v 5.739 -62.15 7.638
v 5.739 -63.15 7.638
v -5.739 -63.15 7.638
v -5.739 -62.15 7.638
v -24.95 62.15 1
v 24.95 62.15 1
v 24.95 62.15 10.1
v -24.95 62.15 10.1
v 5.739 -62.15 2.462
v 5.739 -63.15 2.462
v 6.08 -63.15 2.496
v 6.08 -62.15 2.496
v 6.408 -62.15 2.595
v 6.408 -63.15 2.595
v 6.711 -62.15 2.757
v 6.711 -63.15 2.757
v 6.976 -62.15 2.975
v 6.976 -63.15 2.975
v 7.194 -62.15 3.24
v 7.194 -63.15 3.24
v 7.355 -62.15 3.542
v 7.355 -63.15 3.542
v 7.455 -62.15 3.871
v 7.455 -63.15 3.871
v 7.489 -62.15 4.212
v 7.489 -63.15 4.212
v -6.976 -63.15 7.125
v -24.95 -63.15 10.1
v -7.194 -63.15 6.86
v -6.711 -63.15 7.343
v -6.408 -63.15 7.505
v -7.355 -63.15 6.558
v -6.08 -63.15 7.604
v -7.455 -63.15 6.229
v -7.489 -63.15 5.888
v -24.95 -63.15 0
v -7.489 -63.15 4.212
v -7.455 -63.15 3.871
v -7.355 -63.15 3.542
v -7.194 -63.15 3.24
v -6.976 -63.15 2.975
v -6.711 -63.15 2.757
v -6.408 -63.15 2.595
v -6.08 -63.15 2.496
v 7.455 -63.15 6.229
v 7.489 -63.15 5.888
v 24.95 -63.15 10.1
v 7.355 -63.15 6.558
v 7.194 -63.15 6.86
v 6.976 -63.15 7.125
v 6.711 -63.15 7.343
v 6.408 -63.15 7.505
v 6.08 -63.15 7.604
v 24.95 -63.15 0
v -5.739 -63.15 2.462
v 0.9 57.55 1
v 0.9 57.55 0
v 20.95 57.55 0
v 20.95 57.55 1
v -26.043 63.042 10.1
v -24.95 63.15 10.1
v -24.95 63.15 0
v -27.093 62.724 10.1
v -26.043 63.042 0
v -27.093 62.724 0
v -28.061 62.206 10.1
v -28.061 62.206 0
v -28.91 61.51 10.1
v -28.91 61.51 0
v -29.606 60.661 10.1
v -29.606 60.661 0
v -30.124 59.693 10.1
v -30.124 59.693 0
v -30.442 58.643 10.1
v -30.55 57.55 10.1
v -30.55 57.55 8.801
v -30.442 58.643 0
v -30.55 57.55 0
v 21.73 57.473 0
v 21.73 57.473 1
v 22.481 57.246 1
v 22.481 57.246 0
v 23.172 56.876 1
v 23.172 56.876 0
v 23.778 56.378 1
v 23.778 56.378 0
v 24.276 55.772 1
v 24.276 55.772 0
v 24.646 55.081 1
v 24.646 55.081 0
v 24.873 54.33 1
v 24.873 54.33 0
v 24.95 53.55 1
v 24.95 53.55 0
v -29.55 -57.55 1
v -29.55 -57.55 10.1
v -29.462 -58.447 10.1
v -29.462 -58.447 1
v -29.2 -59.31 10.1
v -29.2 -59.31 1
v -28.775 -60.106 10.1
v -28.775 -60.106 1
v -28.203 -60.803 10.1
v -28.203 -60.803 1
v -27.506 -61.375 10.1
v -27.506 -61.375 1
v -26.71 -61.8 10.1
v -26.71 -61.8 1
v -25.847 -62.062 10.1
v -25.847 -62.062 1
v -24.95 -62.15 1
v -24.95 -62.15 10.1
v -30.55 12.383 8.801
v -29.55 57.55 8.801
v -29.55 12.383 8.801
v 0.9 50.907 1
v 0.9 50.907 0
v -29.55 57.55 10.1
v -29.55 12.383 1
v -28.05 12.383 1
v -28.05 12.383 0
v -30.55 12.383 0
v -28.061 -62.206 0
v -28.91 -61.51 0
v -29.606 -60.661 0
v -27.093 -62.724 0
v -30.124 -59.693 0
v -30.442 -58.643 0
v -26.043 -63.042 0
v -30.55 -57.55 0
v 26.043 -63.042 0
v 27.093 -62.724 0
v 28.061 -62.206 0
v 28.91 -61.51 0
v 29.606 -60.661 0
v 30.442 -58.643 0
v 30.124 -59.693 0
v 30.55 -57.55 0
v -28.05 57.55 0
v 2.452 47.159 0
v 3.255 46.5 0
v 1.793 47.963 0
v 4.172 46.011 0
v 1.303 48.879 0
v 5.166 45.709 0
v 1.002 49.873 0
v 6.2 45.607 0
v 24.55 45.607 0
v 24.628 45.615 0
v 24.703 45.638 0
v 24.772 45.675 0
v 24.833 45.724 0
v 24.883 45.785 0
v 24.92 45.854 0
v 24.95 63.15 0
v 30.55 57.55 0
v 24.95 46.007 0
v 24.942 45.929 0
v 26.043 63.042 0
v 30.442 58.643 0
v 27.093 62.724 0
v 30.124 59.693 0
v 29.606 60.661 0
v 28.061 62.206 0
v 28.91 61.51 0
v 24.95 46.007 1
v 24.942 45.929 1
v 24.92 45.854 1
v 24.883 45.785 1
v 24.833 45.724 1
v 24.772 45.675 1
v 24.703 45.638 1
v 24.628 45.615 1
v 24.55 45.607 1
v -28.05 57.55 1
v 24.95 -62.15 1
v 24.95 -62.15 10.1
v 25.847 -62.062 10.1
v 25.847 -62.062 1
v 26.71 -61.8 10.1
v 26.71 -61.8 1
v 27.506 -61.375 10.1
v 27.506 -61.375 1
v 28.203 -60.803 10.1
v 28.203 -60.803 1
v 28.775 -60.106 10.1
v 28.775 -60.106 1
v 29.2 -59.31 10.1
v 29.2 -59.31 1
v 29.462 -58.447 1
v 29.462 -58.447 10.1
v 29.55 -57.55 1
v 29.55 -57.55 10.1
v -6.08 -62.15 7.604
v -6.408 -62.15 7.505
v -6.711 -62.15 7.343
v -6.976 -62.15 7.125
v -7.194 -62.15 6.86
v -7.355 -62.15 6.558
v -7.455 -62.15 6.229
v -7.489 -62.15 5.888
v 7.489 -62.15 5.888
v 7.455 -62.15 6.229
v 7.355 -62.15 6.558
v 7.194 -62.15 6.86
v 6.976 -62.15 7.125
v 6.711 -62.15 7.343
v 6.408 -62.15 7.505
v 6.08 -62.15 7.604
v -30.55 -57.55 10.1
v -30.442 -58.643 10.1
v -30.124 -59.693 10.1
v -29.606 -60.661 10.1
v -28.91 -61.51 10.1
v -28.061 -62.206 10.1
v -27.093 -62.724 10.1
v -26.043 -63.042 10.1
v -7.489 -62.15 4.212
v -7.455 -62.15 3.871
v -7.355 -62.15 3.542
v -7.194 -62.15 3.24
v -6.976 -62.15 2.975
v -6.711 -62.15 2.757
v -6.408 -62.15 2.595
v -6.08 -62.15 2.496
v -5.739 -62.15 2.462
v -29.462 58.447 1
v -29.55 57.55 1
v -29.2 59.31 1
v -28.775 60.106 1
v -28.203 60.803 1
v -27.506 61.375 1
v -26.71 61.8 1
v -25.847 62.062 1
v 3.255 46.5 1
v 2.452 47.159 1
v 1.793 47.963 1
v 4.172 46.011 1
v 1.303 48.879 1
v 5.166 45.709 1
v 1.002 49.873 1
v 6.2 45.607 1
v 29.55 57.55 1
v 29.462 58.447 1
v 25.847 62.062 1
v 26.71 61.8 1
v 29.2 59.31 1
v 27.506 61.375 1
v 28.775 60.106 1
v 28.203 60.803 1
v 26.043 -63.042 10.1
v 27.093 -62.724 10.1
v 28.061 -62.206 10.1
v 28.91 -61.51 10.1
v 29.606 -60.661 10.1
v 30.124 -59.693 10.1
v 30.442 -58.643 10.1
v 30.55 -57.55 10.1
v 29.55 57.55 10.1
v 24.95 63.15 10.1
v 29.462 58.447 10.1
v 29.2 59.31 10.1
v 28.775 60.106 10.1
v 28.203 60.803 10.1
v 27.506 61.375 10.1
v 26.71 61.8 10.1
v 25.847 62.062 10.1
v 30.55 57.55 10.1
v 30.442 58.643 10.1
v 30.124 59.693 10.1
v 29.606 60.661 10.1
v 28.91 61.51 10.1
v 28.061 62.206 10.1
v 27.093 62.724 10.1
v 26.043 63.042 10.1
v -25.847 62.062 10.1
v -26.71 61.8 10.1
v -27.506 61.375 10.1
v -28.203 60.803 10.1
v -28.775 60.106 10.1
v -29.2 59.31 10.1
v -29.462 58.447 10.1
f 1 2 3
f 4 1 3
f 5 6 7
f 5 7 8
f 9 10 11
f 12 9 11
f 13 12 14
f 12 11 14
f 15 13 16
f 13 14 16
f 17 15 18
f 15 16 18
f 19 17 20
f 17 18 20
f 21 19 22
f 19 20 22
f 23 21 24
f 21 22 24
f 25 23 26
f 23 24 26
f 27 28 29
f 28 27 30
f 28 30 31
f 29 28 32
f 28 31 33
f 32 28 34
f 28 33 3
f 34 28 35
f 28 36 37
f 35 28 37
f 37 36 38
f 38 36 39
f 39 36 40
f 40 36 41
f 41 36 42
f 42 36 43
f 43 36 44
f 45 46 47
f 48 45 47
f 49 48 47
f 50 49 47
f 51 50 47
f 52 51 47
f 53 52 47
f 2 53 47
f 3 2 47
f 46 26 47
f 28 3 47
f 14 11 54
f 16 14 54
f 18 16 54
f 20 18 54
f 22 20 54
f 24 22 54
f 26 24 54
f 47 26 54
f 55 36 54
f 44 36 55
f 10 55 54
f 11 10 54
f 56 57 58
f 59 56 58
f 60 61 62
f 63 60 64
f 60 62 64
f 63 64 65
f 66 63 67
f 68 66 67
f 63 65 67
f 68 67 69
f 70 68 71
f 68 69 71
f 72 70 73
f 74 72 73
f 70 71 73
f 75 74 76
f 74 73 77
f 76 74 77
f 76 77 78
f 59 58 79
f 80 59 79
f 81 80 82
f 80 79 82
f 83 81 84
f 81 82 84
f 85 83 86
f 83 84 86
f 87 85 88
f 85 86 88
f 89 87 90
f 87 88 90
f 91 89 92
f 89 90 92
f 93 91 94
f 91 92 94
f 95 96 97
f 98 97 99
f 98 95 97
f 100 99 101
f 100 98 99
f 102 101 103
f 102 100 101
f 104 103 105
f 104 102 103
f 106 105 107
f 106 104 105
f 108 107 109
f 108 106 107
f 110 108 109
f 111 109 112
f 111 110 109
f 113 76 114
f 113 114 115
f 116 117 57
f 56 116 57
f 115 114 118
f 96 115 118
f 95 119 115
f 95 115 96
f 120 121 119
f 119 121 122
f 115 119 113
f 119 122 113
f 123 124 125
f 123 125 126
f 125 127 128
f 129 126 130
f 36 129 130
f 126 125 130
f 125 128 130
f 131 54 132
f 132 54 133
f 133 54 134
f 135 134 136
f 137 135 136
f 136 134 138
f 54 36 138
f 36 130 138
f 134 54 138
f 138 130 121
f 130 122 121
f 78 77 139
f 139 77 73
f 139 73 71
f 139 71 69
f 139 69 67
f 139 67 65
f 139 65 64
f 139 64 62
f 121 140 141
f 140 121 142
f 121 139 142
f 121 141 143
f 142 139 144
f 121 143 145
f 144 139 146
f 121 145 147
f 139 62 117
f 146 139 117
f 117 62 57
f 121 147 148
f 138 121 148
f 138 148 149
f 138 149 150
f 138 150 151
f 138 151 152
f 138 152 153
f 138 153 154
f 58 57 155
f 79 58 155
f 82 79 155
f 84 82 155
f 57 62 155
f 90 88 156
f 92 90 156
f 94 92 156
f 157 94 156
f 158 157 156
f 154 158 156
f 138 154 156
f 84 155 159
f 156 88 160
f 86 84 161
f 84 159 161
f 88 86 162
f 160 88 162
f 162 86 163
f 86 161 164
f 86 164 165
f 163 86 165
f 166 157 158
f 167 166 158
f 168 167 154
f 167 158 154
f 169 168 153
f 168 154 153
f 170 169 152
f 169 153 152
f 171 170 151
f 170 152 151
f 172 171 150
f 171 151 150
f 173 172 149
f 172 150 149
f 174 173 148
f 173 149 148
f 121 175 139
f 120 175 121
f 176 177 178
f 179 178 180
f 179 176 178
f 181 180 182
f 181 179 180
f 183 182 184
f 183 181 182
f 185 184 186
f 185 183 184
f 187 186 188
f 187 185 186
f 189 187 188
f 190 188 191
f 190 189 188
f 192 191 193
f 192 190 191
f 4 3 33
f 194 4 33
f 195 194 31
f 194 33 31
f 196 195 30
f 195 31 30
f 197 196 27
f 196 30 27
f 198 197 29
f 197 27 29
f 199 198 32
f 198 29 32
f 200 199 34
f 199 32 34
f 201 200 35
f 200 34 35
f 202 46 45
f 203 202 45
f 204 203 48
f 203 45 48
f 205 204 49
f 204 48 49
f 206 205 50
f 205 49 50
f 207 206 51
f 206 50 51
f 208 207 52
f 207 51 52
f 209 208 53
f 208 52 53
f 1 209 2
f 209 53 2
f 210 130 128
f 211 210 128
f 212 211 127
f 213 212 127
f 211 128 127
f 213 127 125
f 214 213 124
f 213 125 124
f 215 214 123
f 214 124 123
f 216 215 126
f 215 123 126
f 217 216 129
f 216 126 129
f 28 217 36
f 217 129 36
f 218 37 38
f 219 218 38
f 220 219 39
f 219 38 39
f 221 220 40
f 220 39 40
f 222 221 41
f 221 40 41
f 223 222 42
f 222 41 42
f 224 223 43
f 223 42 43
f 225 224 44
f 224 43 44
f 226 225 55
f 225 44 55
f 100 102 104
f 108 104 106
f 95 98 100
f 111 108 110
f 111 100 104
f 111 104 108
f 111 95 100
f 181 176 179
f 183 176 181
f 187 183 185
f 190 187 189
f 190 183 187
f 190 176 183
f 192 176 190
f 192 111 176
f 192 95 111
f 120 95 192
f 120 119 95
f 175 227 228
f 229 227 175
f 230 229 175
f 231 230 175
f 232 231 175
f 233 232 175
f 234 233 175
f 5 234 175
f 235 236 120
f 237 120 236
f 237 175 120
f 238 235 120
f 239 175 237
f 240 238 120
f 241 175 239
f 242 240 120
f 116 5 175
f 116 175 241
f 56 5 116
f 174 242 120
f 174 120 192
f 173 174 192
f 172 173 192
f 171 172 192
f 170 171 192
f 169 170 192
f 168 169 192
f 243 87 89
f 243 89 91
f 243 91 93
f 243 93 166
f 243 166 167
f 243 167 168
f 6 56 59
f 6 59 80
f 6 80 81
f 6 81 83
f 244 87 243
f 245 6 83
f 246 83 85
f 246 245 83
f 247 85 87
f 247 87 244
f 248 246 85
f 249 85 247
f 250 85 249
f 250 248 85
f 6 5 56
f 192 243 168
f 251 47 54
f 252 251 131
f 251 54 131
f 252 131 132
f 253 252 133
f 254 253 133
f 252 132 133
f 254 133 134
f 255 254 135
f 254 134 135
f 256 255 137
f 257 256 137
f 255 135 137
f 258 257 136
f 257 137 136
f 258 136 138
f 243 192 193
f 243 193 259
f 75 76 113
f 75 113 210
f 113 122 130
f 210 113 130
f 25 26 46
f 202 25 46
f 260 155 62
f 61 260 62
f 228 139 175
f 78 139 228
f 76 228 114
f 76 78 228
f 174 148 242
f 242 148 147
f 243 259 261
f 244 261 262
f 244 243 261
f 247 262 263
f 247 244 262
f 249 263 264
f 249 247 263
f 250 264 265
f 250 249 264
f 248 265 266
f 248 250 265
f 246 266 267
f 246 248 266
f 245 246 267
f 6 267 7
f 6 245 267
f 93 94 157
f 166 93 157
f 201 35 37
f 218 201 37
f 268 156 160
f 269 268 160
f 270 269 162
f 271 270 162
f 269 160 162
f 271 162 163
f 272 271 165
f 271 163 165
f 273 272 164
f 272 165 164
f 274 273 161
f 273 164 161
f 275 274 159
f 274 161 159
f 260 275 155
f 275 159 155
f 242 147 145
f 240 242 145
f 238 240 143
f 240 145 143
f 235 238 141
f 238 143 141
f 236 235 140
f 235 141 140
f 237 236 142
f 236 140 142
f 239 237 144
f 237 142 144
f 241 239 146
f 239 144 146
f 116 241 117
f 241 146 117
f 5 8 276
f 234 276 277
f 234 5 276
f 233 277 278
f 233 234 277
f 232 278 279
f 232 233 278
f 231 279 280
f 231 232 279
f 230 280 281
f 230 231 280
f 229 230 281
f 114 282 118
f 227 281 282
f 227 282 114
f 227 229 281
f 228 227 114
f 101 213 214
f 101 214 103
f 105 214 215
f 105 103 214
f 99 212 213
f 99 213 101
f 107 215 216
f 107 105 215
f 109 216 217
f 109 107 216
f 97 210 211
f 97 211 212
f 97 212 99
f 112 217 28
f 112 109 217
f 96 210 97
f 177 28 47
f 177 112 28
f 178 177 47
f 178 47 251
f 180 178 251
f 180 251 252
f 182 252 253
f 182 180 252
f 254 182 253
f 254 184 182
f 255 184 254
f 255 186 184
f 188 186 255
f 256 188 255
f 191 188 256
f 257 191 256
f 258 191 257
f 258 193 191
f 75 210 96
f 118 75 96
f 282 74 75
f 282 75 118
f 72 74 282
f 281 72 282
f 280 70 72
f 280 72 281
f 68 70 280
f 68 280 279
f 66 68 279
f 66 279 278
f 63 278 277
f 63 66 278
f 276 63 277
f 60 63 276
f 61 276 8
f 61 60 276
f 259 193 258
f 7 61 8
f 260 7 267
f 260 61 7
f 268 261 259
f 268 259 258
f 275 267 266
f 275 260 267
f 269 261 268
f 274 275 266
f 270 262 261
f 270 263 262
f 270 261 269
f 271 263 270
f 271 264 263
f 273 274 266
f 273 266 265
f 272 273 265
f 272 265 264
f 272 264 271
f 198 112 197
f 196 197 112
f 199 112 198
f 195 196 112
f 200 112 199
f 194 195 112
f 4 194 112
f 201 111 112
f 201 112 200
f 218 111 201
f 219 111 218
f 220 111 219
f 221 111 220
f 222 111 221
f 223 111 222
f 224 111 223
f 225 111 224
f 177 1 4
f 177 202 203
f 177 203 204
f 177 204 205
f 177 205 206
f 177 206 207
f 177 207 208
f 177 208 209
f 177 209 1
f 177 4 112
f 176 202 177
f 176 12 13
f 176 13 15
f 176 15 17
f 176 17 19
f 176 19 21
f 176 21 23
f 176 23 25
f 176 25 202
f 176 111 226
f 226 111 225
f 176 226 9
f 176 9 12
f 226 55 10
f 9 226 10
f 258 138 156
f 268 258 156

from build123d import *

# Parameters (mm, degrees)
F1_DEPTH = 10.1
F2_T     = -1
F4_DEPTH = 25
F5_W     = 45.166726
F5_H     = 8.800845
F6_DEPTH = 2.5
F8_DEPTH = 2.5


with BuildPart() as f1:
    # F0 (on Top) → F1 (new body)
    with BuildSketch(Plane.XY):
        with BuildLine():
            Line((24.95, 63.15), (-24.95, 63.15))
            ThreePointArc((-24.95, 63.15), (-28.909798, 61.509798), (-30.55, 57.55))
            Line((-30.55, 57.55), (-30.55, -57.55))
            ThreePointArc((-30.55, -57.55), (-28.909798, -61.509798), (-24.95, -63.15))
            Line((-24.95, -63.15), (24.95, -63.15))
            ThreePointArc((24.95, -63.15), (28.909798, -61.509798), (30.55, -57.55))
            Line((30.55, -57.55), (30.55, 57.55))
            ThreePointArc((30.55, 57.55), (28.909798, 61.509798), (24.95, 63.15))
        make_face()
    extrude(amount=F1_DEPTH)

    # F2
    f2_openings = [f1.faces().sort_by_distance(p)[0] for p in [
        (0, 0, 10.1),
    ]]
    offset(amount=F2_T, openings=f2_openings)

    # F3 (on face) → F4 (cut)
    with BuildSketch(Plane(origin=(0, 0, 0), x_dir=(1, 0, 0), z_dir=(0, 0, -1))):
        with BuildLine():
            Line((0.899941, -57.55), (20.95, -57.55))
            ThreePointArc((20.95, -57.55), (23.778427, -56.378427), (24.95, -53.55))
            Line((24.95, -53.55), (24.95, -46.00715))
            ThreePointArc((24.95, -46.00715), (24.832843, -45.724307), (24.55, -45.60715))
            Line((24.55, -45.60715), (6.199941, -45.60715))
            ThreePointArc((6.199941, -45.60715), (2.452275, -47.159484), (0.899941, -50.90715))
            Line((0.899941, -50.90715), (0.899941, -57.55))
        make_face()
    extrude(amount=-F4_DEPTH, mode=Mode.SUBTRACT)

    # F5 (on face) → F6 (cut)
    with BuildSketch(Plane(origin=(-30.55, 0, 0), x_dir=(0, -1, 0), z_dir=(-1, 0, 0))):
        with Locations((-34.966637, 4.400422)):
            Rectangle(F5_W, F5_H)
    extrude(amount=-F6_DEPTH, mode=Mode.SUBTRACT)

    # F7 (on face) → F8 (cut)
    with BuildSketch(Plane.XZ.offset(63.15)):
        with BuildLine():
            Line((5.738557, 7.637859), (-5.738557, 7.637859))
            ThreePointArc((-5.738557, 7.637859), (-6.975994, 7.125296), (-7.488557, 5.887859))
            Line((-7.488557, 5.887859), (-7.488557, 4.212141))
            ThreePointArc((-7.488557, 4.212141), (-6.975994, 2.974704), (-5.738557, 2.462141))
            Line((-5.738557, 2.462141), (5.738557, 2.462141))
            ThreePointArc((5.738557, 2.462141), (6.975994, 2.974704), (7.488557, 4.212141))
            Line((7.488557, 4.212141), (7.488557, 5.887859))
            ThreePointArc((7.488557, 5.887859), (6.975994, 7.125296), (5.738557, 7.637859))
        make_face()
    extrude(amount=-F8_DEPTH, mode=Mode.SUBTRACT)


solid = f1.part
